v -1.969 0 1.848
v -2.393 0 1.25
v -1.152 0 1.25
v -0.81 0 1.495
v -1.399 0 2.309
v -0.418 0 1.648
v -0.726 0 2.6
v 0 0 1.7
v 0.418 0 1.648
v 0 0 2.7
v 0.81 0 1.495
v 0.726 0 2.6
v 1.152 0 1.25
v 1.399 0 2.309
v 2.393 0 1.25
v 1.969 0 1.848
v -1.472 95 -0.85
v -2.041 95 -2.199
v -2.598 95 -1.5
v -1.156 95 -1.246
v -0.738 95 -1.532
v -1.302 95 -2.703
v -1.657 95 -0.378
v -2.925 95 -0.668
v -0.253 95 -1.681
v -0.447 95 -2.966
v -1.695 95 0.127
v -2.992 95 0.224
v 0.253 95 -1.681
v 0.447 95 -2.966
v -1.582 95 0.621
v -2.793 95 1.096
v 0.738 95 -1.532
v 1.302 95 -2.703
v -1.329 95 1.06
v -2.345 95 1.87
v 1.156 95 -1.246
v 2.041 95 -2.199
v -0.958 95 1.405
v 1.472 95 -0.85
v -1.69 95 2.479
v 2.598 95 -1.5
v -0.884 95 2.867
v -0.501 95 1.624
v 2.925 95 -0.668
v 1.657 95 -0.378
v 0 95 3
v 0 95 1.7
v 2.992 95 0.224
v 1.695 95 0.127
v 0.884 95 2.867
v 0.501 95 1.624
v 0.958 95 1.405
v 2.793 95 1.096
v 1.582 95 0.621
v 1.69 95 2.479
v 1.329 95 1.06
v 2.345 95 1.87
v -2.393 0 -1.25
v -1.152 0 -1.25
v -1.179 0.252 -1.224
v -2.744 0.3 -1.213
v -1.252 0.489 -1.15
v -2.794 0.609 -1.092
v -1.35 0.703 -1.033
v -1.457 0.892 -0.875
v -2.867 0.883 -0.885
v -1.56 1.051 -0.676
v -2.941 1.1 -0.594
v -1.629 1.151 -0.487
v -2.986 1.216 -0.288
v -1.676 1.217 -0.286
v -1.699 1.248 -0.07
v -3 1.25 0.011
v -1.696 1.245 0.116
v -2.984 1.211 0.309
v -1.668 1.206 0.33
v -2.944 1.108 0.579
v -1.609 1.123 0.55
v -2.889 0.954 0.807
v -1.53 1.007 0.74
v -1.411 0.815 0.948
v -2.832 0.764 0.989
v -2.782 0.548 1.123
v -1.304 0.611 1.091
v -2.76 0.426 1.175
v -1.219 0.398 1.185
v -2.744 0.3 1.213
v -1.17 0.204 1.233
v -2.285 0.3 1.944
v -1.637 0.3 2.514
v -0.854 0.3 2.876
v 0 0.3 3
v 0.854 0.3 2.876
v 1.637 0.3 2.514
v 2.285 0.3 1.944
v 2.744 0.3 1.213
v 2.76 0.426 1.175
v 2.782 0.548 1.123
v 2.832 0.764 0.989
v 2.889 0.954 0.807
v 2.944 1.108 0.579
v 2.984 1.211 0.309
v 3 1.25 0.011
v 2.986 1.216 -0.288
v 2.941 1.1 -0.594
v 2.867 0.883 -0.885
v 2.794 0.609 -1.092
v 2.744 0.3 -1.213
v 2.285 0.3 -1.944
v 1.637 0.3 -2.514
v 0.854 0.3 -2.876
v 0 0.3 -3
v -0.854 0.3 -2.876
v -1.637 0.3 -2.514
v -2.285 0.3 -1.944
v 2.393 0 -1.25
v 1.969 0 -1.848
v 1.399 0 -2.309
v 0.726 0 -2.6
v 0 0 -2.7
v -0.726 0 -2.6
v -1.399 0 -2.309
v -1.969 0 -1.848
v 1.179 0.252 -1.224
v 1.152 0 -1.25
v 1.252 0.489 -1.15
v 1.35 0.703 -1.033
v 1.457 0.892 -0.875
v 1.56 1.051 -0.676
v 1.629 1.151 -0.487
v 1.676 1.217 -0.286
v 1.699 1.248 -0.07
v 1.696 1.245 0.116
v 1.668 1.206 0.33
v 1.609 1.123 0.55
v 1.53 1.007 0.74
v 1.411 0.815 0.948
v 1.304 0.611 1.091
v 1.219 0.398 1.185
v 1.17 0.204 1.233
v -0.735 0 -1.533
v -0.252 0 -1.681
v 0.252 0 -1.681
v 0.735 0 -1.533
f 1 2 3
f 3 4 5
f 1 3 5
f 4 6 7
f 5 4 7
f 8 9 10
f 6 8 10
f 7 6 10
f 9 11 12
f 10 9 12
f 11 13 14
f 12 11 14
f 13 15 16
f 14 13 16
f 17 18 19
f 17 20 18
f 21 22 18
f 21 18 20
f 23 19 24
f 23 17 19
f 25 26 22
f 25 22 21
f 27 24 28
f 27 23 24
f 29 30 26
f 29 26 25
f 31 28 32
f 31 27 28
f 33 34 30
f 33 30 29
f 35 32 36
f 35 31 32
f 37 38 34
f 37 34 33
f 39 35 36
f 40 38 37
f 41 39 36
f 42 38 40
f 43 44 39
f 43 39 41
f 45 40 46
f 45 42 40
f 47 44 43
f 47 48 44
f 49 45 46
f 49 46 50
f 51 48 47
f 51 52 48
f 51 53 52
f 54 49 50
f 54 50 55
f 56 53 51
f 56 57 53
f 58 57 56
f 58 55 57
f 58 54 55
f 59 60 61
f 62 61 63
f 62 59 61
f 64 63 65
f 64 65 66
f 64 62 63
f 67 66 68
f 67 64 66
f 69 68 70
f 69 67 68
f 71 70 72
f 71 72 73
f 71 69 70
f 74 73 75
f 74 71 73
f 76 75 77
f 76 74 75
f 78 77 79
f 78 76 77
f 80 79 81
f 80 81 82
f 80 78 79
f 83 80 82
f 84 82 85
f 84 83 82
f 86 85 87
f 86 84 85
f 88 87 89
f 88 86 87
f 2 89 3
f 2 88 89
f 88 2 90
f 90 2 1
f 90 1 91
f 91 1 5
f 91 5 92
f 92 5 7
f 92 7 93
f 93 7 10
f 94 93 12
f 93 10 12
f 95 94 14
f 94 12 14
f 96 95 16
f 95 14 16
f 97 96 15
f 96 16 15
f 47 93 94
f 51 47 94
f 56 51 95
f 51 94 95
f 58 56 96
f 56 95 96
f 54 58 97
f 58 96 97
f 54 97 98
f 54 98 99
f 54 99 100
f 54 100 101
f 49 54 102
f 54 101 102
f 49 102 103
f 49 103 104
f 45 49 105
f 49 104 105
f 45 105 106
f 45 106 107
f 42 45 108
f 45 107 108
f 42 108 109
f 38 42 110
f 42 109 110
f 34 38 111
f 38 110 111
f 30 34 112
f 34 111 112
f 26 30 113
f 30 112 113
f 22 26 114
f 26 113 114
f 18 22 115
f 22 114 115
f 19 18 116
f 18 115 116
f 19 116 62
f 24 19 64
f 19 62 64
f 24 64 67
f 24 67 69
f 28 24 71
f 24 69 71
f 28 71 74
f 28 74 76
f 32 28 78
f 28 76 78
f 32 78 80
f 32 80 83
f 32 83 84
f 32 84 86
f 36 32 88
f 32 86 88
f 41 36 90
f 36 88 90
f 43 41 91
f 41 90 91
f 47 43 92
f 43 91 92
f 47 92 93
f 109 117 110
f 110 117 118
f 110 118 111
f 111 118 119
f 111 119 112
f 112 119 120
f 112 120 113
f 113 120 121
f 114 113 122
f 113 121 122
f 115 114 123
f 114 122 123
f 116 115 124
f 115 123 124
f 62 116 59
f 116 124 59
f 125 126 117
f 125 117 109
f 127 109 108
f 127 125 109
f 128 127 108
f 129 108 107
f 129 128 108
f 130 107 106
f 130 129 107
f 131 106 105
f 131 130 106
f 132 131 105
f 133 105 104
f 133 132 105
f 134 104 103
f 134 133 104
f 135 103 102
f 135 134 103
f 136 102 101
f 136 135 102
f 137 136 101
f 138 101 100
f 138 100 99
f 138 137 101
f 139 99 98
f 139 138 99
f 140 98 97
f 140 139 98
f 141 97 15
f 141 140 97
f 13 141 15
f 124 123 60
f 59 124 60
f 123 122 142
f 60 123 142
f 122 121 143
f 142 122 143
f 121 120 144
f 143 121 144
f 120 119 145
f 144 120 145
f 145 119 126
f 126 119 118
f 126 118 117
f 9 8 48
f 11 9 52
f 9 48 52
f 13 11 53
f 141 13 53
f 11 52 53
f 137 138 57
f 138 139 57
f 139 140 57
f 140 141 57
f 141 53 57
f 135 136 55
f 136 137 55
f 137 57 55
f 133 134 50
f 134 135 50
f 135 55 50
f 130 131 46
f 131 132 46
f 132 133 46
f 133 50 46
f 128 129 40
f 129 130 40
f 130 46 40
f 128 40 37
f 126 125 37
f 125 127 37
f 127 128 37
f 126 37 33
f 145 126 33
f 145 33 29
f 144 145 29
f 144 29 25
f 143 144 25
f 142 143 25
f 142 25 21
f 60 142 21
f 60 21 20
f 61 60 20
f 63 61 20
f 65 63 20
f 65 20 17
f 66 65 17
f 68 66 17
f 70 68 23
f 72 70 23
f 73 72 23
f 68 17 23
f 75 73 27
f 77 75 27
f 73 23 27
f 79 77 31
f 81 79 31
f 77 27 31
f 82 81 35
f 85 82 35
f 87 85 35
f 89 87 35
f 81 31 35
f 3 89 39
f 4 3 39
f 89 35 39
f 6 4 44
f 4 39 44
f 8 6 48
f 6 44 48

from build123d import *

# Parameters (mm, degrees)
SKETCH1_R               = 3
BOSS_EXTRUDE1_DEPTH     = 95
SKETCH2_R               = 1.7
CUT_EXTRUDE1_DEPTH      = 96.094689652
CHAMFER1_SIZE           = 0.3
CUT_EXTRUDE2_DEPTH      = 96.094689652
CUT_EXTRUDE2_DEPTH_BACK = 96.094689652
SKETCH3_R               = 1.25


with BuildPart() as part:
    # Sketch1 → Boss-Extrude1 (new body)
    with BuildSketch(Plane(origin=(0, 0, 0), x_dir=(1, 0, 0), z_dir=(0, 1, 0))):
        with Locations(Location((0, 0, 0), (0, 0, 270))):
            Circle(SKETCH1_R)
    extrude(amount=BOSS_EXTRUDE1_DEPTH)

    # Sketch2 → Cut-Extrude1 (cut, through all)
    with BuildSketch(Plane(origin=(0, 95, 0), x_dir=(1, 0, 0), z_dir=(0, 1, 0))):
        with Locations(Location((0, 0, 0), (0, 0, 270))):
            Circle(SKETCH2_R)
    extrude(amount=-CUT_EXTRUDE1_DEPTH, mode=Mode.SUBTRACT)

    # Chamfer1
    chamfer1_edges = [part.edges().sort_by_distance(p)[0] for p in [
        (0, 0, -3),
    ]]
    chamfer(chamfer1_edges, length=CHAMFER1_SIZE)

    # Sketch3 → Cut-Extrude2 (cut, two sides: drawn at the far end of the back side and taken through both)
    with BuildSketch(Plane(origin=(0, 0, 0), x_dir=(0, 0, -1), z_dir=(1, 0, 0)).offset(-CUT_EXTRUDE2_DEPTH_BACK)):
        Circle(SKETCH3_R)
    extrude(amount=CUT_EXTRUDE2_DEPTH + CUT_EXTRUDE2_DEPTH_BACK, mode=Mode.SUBTRACT)


solid = part.part
